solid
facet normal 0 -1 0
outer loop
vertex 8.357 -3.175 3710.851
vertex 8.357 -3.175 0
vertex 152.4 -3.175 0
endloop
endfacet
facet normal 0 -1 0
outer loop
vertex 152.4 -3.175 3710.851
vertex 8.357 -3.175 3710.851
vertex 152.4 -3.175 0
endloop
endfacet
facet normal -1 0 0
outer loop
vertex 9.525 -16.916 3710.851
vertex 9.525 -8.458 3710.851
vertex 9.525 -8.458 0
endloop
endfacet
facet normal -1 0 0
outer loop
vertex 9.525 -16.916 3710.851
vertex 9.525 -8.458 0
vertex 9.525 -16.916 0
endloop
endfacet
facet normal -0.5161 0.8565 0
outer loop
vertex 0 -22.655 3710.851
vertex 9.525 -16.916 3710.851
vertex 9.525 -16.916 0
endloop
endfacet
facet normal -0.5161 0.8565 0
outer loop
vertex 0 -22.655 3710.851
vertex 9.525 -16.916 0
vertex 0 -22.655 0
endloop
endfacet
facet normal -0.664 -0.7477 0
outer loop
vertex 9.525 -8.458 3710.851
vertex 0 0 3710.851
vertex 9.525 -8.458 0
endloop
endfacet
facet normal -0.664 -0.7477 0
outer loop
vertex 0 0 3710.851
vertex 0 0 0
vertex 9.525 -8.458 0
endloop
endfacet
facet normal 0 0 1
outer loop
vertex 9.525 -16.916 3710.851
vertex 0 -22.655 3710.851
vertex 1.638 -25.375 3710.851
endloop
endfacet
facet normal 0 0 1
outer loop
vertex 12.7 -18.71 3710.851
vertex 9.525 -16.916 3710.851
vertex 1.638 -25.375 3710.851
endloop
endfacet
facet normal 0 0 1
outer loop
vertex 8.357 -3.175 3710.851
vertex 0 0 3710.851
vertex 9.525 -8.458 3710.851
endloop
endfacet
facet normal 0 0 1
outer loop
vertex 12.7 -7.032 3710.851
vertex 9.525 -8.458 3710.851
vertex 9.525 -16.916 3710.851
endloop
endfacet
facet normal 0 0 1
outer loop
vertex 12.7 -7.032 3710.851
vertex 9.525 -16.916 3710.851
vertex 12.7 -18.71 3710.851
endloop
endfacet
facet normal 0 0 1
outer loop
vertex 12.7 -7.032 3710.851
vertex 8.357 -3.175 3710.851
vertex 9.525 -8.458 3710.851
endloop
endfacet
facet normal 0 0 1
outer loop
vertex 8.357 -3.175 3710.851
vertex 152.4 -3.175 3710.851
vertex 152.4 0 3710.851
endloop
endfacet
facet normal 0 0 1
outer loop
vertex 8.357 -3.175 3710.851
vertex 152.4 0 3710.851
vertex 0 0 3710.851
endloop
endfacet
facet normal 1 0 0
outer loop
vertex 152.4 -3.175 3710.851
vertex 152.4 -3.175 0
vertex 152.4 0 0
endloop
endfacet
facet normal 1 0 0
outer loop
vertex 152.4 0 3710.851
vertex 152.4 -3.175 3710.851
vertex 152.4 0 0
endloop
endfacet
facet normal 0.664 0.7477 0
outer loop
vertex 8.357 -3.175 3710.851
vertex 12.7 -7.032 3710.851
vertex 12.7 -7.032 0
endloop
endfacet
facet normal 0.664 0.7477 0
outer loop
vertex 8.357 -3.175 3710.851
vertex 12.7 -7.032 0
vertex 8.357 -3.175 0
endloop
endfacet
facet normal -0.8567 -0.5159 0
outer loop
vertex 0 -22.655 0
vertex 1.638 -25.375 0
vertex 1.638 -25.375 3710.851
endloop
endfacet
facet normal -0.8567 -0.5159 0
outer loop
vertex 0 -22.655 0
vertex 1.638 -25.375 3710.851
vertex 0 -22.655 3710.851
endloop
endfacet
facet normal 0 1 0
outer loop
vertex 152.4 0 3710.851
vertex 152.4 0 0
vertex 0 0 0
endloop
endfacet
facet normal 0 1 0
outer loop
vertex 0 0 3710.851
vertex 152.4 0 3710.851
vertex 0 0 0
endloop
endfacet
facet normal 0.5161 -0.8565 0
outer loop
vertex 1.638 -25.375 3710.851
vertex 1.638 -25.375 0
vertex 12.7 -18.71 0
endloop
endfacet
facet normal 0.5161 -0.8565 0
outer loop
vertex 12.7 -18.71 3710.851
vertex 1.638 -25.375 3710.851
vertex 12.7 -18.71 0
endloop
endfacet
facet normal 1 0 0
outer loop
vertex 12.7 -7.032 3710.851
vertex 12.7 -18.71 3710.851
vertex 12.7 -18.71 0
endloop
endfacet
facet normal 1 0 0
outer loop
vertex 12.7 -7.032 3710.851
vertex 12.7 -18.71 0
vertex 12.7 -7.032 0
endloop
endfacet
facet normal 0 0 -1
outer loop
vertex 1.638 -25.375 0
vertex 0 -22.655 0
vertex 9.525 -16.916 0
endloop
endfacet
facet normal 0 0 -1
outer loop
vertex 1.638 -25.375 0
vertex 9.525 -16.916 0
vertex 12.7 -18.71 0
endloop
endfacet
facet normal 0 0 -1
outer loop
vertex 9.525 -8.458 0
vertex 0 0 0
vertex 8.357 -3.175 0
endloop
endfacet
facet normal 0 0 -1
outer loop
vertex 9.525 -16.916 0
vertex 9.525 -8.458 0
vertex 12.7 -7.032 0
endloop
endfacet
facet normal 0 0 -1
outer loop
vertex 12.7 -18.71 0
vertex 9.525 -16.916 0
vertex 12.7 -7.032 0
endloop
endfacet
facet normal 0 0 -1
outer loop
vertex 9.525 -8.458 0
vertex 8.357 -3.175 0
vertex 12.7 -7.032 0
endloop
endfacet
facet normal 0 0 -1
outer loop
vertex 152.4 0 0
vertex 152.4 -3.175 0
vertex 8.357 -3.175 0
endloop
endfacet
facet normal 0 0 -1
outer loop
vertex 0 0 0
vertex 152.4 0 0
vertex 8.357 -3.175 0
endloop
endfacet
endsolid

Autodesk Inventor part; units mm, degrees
ref_plane "YZ Plane" through (0, 0, 0) normal (1, 0, 0) x (0, 1, 0)
ref_plane "XZ Plane" through (0, 0, 0) normal (0, 1, 0) x (-1, 0, 0)
ref_plane "XY Plane" through (0, 0, 0) normal (0, 0, 1) x (1, 0, 0)
sketch "Sketch1" plane through (0, 0, 0) normal (0, 0, 1) x (1, 0, 0)
  line L0 (152.4, -3.175) -> (152.4, 0)
  line L1 (152.4, 0) -> (0, 0)
  line L2 (0, 0) -> (9.525, -8.4582)
  line L3 (9.525, -8.4582) -> (9.525, -16.9164)
  line L4 (9.525, -16.9164) -> (0, -22.655)
  line L5 (1.6385, -25.3746) -> (12.7, -18.7102)
  line L6 (12.7, -18.7102) -> (12.7, -7.0315)
  line L7 (12.7, -7.0315) -> (8.3571, -3.175)
  line L8 (8.3571, -3.175) -> (152.4, -3.175)
  line L9 (1.6385, -25.3746) -> (0, -22.655)
  line L10 (0, 0) -> (0, -22.655)
  dimension "d49" = 3.175
  dimension "d50" = 3.175
  dimension "d51" = 3.175
  dimension "d52" = 3.175
  dimension "d54" = 8.4582
  dimension "d55" = 8.4582
  dimension "d61" = 8.4582
  dimension "d62" = 152.4
  dimension "d64" = 12.7
extrude "Extrusion2" add sketch "Sketch1" along normal blind 3710.8511 contours L8 L7 L6 L5 L9 L4 L3 L2 L1 L0
properties part number "Drip_Edge_For_Side" material "Aluminum 6061"
